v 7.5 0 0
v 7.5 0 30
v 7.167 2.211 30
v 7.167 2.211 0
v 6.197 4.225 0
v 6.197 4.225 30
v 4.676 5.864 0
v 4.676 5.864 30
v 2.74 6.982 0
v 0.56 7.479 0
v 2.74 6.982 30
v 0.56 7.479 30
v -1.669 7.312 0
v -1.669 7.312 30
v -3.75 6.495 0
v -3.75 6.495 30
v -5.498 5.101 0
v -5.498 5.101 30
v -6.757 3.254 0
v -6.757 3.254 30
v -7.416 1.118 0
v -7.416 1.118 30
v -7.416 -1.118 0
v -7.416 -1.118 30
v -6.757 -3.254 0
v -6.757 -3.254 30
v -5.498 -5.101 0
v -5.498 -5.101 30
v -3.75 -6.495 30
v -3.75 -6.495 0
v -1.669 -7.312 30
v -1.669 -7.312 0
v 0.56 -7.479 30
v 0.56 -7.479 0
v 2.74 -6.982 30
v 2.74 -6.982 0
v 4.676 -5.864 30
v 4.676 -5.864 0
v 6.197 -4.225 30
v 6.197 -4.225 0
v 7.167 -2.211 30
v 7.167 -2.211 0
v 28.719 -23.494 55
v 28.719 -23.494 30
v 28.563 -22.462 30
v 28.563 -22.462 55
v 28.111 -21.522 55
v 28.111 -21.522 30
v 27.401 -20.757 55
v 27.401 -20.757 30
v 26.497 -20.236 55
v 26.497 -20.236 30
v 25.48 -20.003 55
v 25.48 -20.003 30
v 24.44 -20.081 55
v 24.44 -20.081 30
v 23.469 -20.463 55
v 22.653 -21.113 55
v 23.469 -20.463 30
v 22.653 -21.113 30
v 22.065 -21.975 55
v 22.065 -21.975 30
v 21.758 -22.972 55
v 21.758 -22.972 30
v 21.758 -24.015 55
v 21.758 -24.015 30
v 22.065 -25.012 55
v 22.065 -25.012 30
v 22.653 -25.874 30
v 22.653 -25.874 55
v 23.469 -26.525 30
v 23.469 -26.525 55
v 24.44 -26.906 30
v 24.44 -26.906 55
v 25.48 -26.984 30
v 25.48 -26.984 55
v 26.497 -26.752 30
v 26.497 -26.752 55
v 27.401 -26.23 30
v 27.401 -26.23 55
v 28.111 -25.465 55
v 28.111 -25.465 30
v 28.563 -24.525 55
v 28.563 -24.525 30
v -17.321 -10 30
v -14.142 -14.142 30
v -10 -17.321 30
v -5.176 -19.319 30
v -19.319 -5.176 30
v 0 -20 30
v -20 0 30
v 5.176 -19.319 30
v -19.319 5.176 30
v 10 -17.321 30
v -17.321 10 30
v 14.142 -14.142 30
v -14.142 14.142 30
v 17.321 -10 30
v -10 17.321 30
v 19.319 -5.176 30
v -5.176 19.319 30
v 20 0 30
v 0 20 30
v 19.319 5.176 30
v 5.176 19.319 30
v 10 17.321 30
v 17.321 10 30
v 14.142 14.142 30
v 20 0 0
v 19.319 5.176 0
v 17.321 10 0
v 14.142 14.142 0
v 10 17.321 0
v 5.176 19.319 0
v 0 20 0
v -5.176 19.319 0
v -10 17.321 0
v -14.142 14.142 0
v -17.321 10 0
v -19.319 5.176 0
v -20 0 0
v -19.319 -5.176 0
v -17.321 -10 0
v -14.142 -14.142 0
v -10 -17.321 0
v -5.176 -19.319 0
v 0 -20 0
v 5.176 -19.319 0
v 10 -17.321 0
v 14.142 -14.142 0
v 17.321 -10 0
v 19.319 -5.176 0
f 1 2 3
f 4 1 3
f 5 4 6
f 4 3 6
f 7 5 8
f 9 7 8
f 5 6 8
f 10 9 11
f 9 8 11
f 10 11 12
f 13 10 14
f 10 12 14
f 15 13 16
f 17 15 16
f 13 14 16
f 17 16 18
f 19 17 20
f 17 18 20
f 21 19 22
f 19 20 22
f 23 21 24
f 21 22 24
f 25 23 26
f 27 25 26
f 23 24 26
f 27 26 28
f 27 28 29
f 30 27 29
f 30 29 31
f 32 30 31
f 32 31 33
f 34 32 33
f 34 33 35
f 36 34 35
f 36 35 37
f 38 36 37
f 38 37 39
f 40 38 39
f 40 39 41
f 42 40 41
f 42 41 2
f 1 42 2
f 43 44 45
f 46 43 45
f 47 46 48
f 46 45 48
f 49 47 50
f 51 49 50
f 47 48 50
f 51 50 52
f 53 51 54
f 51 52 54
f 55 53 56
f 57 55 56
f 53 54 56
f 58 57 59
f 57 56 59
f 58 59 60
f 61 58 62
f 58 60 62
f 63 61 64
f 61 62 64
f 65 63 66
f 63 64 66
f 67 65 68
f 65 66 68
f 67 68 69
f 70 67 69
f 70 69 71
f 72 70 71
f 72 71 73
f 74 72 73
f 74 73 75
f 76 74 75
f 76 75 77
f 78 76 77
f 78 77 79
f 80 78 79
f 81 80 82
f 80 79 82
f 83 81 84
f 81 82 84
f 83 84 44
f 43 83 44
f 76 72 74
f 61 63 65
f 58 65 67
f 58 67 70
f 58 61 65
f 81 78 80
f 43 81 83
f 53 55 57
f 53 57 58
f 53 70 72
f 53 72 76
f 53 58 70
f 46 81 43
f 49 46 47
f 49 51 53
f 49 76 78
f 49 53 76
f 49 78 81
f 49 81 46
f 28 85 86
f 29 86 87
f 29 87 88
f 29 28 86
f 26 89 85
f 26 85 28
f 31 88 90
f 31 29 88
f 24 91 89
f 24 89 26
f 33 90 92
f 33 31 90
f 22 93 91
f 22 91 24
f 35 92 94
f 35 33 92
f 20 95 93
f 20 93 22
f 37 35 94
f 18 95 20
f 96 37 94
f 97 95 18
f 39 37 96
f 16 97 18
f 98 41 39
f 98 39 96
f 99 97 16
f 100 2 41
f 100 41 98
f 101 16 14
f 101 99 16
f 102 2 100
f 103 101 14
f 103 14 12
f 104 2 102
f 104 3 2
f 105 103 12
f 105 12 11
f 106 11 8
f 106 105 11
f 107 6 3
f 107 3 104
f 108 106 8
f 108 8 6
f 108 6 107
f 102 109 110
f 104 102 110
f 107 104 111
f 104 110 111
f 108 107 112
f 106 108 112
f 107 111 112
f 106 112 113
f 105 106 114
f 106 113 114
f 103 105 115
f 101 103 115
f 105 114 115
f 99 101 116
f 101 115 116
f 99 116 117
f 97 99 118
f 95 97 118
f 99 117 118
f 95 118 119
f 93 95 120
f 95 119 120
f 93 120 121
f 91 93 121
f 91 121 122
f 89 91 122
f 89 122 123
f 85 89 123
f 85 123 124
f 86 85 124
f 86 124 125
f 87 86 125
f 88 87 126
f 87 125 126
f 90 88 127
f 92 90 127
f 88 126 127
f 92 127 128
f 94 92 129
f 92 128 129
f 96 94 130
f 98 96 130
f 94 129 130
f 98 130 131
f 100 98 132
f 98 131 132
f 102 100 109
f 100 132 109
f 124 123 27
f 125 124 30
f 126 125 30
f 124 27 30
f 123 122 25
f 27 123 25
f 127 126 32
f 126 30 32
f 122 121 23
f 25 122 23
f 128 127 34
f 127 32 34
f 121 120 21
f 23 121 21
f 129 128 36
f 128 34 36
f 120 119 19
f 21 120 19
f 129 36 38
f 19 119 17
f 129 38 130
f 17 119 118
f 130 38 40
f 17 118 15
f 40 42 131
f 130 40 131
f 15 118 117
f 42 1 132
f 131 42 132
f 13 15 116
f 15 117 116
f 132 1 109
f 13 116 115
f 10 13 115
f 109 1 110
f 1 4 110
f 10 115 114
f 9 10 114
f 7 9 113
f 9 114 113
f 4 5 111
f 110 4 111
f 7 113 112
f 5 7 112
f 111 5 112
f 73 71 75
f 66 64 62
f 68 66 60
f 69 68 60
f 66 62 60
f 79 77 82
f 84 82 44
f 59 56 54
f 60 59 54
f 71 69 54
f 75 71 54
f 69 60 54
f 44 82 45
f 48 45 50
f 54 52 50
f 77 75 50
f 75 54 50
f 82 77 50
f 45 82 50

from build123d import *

# Parameters (mm, degrees)
F0_R     = 20
F1_DEPTH = 30
F2_R     = 3.5
F3_DEPTH = 25
F4_R     = 7.5
F5_DEPTH = 30.001


with BuildPart() as f1:
    # F0 (on Top) → F1 (new body)
    with BuildSketch(Plane.XY):
        Circle(F0_R)
    extrude(amount=F1_DEPTH)

    # F4 (on face) → F5 (cut, through all)
    with BuildSketch(Plane.XY.offset(30)):
        Circle(F4_R)
    extrude(amount=-F5_DEPTH, mode=Mode.SUBTRACT)


with BuildPart() as f3:
    # F2 (on face) → F3 (new body)
    with BuildSketch(Plane.XY.offset(30)):
        with Locations((25.218701, -23.493621)):
            Circle(F2_R)
    extrude(amount=F3_DEPTH)


solid = Compound([f1.part, f3.part])
